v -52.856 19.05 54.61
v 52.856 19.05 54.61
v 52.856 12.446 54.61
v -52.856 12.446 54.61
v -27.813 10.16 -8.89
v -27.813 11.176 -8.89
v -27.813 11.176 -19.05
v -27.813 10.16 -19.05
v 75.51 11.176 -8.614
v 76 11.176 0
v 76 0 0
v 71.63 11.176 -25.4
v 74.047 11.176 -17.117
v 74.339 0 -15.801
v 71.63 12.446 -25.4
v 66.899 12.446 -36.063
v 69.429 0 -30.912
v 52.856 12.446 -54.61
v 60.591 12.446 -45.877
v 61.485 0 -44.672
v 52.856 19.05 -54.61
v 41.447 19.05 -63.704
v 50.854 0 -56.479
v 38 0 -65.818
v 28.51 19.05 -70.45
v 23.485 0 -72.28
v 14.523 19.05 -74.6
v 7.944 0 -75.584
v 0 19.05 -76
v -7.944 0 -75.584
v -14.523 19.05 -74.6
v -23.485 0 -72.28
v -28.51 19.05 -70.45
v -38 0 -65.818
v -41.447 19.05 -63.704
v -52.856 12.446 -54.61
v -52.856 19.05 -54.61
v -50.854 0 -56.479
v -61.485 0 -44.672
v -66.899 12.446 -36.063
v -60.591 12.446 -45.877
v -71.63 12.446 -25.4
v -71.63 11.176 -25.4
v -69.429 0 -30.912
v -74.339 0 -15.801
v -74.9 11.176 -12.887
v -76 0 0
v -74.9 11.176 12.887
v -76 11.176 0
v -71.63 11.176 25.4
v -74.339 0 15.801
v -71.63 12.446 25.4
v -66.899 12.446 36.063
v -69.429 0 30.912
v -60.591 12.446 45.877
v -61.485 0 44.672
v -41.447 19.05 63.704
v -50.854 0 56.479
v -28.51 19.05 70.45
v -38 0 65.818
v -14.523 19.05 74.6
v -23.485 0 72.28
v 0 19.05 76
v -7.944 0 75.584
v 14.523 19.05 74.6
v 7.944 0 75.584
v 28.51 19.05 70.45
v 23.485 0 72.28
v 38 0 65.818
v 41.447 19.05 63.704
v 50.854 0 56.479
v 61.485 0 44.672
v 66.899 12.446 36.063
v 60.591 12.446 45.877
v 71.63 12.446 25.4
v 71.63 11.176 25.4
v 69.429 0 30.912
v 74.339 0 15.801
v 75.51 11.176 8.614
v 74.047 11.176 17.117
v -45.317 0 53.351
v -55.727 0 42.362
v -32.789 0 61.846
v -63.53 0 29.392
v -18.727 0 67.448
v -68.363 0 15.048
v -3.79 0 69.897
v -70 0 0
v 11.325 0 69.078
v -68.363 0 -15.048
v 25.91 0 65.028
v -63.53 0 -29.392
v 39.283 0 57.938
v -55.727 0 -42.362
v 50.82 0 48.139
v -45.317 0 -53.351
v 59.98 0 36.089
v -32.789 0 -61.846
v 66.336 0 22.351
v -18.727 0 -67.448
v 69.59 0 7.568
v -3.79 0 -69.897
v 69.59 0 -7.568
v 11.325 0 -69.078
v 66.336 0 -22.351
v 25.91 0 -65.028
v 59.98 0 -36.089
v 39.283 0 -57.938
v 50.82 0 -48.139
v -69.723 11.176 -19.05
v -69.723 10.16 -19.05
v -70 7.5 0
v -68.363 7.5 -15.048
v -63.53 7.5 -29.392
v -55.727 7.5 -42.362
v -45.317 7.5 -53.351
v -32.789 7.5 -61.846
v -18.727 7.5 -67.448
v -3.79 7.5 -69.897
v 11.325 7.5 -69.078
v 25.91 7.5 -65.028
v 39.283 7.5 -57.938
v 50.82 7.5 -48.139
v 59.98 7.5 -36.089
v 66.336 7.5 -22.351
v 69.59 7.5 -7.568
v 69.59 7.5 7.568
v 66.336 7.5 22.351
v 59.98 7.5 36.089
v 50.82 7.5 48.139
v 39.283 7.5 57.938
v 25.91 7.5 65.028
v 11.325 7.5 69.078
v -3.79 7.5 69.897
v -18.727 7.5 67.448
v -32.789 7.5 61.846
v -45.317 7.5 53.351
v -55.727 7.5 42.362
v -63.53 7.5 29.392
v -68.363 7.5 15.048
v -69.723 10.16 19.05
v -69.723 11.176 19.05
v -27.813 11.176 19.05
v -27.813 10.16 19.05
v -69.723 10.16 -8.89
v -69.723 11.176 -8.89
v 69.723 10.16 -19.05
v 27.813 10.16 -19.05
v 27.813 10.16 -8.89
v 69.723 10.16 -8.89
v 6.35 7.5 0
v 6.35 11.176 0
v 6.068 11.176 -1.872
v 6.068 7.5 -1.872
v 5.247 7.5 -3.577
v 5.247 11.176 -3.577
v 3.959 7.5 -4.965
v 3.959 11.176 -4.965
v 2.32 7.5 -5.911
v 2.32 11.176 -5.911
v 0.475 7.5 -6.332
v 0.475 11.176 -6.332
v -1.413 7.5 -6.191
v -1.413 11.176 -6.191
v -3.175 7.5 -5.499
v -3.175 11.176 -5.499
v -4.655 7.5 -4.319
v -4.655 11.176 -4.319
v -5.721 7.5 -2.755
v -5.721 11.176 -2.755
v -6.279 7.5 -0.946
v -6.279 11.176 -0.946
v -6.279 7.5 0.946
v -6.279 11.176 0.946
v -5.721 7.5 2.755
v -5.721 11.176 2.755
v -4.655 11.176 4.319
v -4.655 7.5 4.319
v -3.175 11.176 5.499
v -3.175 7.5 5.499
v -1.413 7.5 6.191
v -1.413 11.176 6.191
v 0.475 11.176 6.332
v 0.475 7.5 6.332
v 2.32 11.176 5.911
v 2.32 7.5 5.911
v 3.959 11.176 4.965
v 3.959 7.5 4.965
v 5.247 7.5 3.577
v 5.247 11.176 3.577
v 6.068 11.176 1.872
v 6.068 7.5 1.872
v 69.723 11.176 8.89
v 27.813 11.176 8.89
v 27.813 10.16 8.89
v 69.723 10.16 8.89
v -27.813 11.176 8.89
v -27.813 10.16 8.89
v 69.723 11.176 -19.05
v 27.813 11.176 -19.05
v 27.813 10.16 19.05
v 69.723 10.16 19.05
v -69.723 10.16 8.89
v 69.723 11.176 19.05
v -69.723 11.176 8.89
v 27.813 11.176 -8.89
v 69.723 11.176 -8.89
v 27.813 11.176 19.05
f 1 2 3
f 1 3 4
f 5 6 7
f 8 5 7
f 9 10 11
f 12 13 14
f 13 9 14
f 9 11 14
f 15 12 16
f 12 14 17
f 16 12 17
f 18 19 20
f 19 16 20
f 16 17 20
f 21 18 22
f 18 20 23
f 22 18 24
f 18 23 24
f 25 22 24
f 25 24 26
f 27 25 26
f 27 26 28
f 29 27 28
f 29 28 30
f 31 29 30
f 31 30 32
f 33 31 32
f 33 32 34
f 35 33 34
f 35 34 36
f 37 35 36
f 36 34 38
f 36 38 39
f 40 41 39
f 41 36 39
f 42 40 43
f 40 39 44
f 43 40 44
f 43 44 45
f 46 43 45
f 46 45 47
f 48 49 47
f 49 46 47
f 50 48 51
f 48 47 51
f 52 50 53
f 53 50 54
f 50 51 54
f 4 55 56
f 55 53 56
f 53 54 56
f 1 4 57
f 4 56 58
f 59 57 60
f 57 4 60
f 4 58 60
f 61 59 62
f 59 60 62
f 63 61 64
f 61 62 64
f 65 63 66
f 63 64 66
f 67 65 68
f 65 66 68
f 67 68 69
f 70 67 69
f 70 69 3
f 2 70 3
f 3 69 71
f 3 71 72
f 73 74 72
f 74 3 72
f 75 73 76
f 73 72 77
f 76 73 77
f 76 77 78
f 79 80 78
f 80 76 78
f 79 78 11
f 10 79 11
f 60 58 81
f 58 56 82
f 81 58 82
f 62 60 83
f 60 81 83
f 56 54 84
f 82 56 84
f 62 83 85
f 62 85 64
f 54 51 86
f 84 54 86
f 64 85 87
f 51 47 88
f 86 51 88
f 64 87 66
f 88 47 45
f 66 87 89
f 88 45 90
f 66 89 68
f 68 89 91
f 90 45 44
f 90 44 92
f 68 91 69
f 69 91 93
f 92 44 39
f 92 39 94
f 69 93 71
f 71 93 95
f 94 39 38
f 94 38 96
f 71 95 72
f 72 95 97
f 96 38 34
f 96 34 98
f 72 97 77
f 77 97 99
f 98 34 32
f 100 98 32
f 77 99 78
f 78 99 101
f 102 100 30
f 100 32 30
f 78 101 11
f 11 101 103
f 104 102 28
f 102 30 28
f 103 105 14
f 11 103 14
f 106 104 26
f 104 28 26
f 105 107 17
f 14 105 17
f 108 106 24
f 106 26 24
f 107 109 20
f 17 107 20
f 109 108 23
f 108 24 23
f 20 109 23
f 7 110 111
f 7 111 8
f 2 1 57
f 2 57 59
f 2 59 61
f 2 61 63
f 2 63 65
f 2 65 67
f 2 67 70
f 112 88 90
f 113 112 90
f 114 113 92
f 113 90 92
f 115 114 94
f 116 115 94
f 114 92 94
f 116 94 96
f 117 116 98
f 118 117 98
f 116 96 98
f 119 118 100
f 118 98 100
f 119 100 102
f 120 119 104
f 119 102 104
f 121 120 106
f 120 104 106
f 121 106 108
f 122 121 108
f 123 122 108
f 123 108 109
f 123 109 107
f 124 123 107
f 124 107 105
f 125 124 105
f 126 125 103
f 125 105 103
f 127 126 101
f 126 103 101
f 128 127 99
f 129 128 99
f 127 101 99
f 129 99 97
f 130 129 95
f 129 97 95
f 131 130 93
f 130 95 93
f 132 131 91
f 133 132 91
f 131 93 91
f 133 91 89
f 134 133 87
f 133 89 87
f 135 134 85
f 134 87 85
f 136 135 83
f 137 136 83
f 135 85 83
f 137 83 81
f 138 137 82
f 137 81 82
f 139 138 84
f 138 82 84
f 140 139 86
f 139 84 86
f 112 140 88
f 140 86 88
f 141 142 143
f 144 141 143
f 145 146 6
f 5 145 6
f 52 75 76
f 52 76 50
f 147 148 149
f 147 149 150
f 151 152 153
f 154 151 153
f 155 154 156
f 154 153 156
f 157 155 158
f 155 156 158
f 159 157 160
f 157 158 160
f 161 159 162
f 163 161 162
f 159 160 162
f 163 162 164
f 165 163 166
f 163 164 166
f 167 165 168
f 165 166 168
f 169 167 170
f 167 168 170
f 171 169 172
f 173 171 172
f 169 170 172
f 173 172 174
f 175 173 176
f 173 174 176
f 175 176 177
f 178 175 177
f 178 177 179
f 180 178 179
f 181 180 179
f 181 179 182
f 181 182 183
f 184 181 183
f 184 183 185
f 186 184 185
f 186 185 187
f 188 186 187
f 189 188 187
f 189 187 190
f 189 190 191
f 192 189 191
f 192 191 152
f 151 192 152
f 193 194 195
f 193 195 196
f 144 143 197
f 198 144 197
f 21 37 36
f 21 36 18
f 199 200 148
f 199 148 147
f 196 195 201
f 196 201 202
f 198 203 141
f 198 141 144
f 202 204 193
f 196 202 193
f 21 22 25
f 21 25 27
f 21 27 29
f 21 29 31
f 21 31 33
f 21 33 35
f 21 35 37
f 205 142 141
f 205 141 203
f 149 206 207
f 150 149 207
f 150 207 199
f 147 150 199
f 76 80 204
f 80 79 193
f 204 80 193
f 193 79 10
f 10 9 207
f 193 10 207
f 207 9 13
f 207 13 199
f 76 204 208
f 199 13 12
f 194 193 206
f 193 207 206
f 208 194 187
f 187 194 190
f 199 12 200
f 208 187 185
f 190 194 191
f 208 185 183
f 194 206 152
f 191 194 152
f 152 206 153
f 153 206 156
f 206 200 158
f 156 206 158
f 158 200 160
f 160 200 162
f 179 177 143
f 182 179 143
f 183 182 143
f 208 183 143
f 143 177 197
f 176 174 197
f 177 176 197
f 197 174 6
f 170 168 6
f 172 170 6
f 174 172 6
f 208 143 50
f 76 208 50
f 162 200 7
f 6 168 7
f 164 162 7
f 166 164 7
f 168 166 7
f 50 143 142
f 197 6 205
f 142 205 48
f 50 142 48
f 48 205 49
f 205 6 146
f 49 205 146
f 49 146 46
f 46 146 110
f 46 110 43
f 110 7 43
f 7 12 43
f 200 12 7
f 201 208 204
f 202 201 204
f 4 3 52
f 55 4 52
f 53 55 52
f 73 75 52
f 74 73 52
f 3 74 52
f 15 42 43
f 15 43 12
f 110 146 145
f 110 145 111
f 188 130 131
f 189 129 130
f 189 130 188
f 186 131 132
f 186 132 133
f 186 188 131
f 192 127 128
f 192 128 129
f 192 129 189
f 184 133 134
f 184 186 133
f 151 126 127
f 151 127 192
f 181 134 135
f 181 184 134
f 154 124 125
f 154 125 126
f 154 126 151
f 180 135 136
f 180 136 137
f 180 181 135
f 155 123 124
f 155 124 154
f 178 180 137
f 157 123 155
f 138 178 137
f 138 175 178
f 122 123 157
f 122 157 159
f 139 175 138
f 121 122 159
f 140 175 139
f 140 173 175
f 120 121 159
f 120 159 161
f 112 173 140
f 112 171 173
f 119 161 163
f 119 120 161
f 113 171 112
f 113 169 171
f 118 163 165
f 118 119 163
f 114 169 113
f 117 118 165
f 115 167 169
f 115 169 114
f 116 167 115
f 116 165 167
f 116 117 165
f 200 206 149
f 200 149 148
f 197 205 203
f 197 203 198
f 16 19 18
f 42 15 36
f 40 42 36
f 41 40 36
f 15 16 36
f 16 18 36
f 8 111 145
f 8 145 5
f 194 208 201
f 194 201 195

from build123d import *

# Parameters (mm, degrees)
SKETCH1_R           = 76
BOSS_EXTRUDE1_DEPTH = 19.05
CUT_EXTRUDE4_DEPTH  = 6.604
SKETCH5_R           = 6.35
CUT_EXTRUDE5_DEPTH  = 20
SKETCH13_R          = 70
CUT_EXTRUDE9_DEPTH  = 7.5
CUT_EXTRUDE11_DEPTH = 1.27
SKETCH16_W          = 41.91
SKETCH16_H          = 10.16
CUT_EXTRUDE12_DEPTH = 1.016


with BuildPart() as part:
    # Sketch1 → Boss-Extrude1 (new body)
    with BuildSketch(Plane(origin=(0, 0, 0), x_dir=(1, 0, 0), z_dir=(0, 1, 0))):
        Circle(SKETCH1_R)
    extrude(amount=BOSS_EXTRUDE1_DEPTH)

    # Sketch2 → Cut-Extrude4 (cut)
    with BuildSketch(Plane(origin=(0, 19.05, 0), x_dir=(1, 0, 0), z_dir=(0, 1, 0))):
        with BuildLine():
            Line((-58.007955522, 54.61), (58.007955522, 54.61))
            ThreePointArc((58.007955522, 54.61), (112.617955522, 0), (58.007955522, -54.61))
            Line((58.007955522, -54.61), (-58.007955522, -54.61))
            ThreePointArc((-58.007955522, -54.61), (-112.617955522, 0), (-58.007955522, 54.61))
        make_face()
    extrude(amount=-CUT_EXTRUDE4_DEPTH, mode=Mode.SUBTRACT)

    # Sketch5 → Cut-Extrude5 (cut)
    with BuildSketch(Plane(origin=(0, 12.446, 0), x_dir=(1, 0, 0), z_dir=(0, 1, 0))):
        Circle(SKETCH5_R)
    extrude(amount=-CUT_EXTRUDE5_DEPTH, mode=Mode.SUBTRACT)

    # Sketch13 → Cut-Extrude9 (cut)
    with BuildSketch(Plane(origin=(0, 0, 0), x_dir=(-1, 0, 0), z_dir=(0, -1, 0))):
        Circle(SKETCH13_R)
    extrude(amount=-CUT_EXTRUDE9_DEPTH, mode=Mode.SUBTRACT)

    # Sketch15 → Cut-Extrude11 (cut)
    with BuildSketch(Plane(origin=(0, 12.446, 0), x_dir=(1, 0, 0), z_dir=(0, 1, 0))):
        with BuildLine():
            Line((76, -25.4), (-76, -25.4))
            ThreePointArc((-76, -25.4), (-101.4, 0), (-76, 25.4))
            Line((-76, 25.4), (76, 25.4))
            ThreePointArc((76, 25.4), (101.4, 0), (76, -25.4))
        make_face()
    extrude(amount=-CUT_EXTRUDE11_DEPTH, mode=Mode.SUBTRACT)

    # Sketch16 → Cut-Extrude12 (cut)
    with BuildSketch(Plane(origin=(0, 11.176, 0), x_dir=(1, 0, 0), z_dir=(0, 1, 0))):
        with Locations((-48.768, -13.97)):
            Rectangle(SKETCH16_W, SKETCH16_H)
        with Locations((-48.768, 13.97)):
            Rectangle(SKETCH16_W, SKETCH16_H)
        with Locations((48.768, -13.97)):
            Rectangle(SKETCH16_W, SKETCH16_H)
        with Locations((48.768, 13.97)):
            Rectangle(SKETCH16_W, SKETCH16_H)
    extrude(amount=-CUT_EXTRUDE12_DEPTH, mode=Mode.SUBTRACT)


solid = part.part
